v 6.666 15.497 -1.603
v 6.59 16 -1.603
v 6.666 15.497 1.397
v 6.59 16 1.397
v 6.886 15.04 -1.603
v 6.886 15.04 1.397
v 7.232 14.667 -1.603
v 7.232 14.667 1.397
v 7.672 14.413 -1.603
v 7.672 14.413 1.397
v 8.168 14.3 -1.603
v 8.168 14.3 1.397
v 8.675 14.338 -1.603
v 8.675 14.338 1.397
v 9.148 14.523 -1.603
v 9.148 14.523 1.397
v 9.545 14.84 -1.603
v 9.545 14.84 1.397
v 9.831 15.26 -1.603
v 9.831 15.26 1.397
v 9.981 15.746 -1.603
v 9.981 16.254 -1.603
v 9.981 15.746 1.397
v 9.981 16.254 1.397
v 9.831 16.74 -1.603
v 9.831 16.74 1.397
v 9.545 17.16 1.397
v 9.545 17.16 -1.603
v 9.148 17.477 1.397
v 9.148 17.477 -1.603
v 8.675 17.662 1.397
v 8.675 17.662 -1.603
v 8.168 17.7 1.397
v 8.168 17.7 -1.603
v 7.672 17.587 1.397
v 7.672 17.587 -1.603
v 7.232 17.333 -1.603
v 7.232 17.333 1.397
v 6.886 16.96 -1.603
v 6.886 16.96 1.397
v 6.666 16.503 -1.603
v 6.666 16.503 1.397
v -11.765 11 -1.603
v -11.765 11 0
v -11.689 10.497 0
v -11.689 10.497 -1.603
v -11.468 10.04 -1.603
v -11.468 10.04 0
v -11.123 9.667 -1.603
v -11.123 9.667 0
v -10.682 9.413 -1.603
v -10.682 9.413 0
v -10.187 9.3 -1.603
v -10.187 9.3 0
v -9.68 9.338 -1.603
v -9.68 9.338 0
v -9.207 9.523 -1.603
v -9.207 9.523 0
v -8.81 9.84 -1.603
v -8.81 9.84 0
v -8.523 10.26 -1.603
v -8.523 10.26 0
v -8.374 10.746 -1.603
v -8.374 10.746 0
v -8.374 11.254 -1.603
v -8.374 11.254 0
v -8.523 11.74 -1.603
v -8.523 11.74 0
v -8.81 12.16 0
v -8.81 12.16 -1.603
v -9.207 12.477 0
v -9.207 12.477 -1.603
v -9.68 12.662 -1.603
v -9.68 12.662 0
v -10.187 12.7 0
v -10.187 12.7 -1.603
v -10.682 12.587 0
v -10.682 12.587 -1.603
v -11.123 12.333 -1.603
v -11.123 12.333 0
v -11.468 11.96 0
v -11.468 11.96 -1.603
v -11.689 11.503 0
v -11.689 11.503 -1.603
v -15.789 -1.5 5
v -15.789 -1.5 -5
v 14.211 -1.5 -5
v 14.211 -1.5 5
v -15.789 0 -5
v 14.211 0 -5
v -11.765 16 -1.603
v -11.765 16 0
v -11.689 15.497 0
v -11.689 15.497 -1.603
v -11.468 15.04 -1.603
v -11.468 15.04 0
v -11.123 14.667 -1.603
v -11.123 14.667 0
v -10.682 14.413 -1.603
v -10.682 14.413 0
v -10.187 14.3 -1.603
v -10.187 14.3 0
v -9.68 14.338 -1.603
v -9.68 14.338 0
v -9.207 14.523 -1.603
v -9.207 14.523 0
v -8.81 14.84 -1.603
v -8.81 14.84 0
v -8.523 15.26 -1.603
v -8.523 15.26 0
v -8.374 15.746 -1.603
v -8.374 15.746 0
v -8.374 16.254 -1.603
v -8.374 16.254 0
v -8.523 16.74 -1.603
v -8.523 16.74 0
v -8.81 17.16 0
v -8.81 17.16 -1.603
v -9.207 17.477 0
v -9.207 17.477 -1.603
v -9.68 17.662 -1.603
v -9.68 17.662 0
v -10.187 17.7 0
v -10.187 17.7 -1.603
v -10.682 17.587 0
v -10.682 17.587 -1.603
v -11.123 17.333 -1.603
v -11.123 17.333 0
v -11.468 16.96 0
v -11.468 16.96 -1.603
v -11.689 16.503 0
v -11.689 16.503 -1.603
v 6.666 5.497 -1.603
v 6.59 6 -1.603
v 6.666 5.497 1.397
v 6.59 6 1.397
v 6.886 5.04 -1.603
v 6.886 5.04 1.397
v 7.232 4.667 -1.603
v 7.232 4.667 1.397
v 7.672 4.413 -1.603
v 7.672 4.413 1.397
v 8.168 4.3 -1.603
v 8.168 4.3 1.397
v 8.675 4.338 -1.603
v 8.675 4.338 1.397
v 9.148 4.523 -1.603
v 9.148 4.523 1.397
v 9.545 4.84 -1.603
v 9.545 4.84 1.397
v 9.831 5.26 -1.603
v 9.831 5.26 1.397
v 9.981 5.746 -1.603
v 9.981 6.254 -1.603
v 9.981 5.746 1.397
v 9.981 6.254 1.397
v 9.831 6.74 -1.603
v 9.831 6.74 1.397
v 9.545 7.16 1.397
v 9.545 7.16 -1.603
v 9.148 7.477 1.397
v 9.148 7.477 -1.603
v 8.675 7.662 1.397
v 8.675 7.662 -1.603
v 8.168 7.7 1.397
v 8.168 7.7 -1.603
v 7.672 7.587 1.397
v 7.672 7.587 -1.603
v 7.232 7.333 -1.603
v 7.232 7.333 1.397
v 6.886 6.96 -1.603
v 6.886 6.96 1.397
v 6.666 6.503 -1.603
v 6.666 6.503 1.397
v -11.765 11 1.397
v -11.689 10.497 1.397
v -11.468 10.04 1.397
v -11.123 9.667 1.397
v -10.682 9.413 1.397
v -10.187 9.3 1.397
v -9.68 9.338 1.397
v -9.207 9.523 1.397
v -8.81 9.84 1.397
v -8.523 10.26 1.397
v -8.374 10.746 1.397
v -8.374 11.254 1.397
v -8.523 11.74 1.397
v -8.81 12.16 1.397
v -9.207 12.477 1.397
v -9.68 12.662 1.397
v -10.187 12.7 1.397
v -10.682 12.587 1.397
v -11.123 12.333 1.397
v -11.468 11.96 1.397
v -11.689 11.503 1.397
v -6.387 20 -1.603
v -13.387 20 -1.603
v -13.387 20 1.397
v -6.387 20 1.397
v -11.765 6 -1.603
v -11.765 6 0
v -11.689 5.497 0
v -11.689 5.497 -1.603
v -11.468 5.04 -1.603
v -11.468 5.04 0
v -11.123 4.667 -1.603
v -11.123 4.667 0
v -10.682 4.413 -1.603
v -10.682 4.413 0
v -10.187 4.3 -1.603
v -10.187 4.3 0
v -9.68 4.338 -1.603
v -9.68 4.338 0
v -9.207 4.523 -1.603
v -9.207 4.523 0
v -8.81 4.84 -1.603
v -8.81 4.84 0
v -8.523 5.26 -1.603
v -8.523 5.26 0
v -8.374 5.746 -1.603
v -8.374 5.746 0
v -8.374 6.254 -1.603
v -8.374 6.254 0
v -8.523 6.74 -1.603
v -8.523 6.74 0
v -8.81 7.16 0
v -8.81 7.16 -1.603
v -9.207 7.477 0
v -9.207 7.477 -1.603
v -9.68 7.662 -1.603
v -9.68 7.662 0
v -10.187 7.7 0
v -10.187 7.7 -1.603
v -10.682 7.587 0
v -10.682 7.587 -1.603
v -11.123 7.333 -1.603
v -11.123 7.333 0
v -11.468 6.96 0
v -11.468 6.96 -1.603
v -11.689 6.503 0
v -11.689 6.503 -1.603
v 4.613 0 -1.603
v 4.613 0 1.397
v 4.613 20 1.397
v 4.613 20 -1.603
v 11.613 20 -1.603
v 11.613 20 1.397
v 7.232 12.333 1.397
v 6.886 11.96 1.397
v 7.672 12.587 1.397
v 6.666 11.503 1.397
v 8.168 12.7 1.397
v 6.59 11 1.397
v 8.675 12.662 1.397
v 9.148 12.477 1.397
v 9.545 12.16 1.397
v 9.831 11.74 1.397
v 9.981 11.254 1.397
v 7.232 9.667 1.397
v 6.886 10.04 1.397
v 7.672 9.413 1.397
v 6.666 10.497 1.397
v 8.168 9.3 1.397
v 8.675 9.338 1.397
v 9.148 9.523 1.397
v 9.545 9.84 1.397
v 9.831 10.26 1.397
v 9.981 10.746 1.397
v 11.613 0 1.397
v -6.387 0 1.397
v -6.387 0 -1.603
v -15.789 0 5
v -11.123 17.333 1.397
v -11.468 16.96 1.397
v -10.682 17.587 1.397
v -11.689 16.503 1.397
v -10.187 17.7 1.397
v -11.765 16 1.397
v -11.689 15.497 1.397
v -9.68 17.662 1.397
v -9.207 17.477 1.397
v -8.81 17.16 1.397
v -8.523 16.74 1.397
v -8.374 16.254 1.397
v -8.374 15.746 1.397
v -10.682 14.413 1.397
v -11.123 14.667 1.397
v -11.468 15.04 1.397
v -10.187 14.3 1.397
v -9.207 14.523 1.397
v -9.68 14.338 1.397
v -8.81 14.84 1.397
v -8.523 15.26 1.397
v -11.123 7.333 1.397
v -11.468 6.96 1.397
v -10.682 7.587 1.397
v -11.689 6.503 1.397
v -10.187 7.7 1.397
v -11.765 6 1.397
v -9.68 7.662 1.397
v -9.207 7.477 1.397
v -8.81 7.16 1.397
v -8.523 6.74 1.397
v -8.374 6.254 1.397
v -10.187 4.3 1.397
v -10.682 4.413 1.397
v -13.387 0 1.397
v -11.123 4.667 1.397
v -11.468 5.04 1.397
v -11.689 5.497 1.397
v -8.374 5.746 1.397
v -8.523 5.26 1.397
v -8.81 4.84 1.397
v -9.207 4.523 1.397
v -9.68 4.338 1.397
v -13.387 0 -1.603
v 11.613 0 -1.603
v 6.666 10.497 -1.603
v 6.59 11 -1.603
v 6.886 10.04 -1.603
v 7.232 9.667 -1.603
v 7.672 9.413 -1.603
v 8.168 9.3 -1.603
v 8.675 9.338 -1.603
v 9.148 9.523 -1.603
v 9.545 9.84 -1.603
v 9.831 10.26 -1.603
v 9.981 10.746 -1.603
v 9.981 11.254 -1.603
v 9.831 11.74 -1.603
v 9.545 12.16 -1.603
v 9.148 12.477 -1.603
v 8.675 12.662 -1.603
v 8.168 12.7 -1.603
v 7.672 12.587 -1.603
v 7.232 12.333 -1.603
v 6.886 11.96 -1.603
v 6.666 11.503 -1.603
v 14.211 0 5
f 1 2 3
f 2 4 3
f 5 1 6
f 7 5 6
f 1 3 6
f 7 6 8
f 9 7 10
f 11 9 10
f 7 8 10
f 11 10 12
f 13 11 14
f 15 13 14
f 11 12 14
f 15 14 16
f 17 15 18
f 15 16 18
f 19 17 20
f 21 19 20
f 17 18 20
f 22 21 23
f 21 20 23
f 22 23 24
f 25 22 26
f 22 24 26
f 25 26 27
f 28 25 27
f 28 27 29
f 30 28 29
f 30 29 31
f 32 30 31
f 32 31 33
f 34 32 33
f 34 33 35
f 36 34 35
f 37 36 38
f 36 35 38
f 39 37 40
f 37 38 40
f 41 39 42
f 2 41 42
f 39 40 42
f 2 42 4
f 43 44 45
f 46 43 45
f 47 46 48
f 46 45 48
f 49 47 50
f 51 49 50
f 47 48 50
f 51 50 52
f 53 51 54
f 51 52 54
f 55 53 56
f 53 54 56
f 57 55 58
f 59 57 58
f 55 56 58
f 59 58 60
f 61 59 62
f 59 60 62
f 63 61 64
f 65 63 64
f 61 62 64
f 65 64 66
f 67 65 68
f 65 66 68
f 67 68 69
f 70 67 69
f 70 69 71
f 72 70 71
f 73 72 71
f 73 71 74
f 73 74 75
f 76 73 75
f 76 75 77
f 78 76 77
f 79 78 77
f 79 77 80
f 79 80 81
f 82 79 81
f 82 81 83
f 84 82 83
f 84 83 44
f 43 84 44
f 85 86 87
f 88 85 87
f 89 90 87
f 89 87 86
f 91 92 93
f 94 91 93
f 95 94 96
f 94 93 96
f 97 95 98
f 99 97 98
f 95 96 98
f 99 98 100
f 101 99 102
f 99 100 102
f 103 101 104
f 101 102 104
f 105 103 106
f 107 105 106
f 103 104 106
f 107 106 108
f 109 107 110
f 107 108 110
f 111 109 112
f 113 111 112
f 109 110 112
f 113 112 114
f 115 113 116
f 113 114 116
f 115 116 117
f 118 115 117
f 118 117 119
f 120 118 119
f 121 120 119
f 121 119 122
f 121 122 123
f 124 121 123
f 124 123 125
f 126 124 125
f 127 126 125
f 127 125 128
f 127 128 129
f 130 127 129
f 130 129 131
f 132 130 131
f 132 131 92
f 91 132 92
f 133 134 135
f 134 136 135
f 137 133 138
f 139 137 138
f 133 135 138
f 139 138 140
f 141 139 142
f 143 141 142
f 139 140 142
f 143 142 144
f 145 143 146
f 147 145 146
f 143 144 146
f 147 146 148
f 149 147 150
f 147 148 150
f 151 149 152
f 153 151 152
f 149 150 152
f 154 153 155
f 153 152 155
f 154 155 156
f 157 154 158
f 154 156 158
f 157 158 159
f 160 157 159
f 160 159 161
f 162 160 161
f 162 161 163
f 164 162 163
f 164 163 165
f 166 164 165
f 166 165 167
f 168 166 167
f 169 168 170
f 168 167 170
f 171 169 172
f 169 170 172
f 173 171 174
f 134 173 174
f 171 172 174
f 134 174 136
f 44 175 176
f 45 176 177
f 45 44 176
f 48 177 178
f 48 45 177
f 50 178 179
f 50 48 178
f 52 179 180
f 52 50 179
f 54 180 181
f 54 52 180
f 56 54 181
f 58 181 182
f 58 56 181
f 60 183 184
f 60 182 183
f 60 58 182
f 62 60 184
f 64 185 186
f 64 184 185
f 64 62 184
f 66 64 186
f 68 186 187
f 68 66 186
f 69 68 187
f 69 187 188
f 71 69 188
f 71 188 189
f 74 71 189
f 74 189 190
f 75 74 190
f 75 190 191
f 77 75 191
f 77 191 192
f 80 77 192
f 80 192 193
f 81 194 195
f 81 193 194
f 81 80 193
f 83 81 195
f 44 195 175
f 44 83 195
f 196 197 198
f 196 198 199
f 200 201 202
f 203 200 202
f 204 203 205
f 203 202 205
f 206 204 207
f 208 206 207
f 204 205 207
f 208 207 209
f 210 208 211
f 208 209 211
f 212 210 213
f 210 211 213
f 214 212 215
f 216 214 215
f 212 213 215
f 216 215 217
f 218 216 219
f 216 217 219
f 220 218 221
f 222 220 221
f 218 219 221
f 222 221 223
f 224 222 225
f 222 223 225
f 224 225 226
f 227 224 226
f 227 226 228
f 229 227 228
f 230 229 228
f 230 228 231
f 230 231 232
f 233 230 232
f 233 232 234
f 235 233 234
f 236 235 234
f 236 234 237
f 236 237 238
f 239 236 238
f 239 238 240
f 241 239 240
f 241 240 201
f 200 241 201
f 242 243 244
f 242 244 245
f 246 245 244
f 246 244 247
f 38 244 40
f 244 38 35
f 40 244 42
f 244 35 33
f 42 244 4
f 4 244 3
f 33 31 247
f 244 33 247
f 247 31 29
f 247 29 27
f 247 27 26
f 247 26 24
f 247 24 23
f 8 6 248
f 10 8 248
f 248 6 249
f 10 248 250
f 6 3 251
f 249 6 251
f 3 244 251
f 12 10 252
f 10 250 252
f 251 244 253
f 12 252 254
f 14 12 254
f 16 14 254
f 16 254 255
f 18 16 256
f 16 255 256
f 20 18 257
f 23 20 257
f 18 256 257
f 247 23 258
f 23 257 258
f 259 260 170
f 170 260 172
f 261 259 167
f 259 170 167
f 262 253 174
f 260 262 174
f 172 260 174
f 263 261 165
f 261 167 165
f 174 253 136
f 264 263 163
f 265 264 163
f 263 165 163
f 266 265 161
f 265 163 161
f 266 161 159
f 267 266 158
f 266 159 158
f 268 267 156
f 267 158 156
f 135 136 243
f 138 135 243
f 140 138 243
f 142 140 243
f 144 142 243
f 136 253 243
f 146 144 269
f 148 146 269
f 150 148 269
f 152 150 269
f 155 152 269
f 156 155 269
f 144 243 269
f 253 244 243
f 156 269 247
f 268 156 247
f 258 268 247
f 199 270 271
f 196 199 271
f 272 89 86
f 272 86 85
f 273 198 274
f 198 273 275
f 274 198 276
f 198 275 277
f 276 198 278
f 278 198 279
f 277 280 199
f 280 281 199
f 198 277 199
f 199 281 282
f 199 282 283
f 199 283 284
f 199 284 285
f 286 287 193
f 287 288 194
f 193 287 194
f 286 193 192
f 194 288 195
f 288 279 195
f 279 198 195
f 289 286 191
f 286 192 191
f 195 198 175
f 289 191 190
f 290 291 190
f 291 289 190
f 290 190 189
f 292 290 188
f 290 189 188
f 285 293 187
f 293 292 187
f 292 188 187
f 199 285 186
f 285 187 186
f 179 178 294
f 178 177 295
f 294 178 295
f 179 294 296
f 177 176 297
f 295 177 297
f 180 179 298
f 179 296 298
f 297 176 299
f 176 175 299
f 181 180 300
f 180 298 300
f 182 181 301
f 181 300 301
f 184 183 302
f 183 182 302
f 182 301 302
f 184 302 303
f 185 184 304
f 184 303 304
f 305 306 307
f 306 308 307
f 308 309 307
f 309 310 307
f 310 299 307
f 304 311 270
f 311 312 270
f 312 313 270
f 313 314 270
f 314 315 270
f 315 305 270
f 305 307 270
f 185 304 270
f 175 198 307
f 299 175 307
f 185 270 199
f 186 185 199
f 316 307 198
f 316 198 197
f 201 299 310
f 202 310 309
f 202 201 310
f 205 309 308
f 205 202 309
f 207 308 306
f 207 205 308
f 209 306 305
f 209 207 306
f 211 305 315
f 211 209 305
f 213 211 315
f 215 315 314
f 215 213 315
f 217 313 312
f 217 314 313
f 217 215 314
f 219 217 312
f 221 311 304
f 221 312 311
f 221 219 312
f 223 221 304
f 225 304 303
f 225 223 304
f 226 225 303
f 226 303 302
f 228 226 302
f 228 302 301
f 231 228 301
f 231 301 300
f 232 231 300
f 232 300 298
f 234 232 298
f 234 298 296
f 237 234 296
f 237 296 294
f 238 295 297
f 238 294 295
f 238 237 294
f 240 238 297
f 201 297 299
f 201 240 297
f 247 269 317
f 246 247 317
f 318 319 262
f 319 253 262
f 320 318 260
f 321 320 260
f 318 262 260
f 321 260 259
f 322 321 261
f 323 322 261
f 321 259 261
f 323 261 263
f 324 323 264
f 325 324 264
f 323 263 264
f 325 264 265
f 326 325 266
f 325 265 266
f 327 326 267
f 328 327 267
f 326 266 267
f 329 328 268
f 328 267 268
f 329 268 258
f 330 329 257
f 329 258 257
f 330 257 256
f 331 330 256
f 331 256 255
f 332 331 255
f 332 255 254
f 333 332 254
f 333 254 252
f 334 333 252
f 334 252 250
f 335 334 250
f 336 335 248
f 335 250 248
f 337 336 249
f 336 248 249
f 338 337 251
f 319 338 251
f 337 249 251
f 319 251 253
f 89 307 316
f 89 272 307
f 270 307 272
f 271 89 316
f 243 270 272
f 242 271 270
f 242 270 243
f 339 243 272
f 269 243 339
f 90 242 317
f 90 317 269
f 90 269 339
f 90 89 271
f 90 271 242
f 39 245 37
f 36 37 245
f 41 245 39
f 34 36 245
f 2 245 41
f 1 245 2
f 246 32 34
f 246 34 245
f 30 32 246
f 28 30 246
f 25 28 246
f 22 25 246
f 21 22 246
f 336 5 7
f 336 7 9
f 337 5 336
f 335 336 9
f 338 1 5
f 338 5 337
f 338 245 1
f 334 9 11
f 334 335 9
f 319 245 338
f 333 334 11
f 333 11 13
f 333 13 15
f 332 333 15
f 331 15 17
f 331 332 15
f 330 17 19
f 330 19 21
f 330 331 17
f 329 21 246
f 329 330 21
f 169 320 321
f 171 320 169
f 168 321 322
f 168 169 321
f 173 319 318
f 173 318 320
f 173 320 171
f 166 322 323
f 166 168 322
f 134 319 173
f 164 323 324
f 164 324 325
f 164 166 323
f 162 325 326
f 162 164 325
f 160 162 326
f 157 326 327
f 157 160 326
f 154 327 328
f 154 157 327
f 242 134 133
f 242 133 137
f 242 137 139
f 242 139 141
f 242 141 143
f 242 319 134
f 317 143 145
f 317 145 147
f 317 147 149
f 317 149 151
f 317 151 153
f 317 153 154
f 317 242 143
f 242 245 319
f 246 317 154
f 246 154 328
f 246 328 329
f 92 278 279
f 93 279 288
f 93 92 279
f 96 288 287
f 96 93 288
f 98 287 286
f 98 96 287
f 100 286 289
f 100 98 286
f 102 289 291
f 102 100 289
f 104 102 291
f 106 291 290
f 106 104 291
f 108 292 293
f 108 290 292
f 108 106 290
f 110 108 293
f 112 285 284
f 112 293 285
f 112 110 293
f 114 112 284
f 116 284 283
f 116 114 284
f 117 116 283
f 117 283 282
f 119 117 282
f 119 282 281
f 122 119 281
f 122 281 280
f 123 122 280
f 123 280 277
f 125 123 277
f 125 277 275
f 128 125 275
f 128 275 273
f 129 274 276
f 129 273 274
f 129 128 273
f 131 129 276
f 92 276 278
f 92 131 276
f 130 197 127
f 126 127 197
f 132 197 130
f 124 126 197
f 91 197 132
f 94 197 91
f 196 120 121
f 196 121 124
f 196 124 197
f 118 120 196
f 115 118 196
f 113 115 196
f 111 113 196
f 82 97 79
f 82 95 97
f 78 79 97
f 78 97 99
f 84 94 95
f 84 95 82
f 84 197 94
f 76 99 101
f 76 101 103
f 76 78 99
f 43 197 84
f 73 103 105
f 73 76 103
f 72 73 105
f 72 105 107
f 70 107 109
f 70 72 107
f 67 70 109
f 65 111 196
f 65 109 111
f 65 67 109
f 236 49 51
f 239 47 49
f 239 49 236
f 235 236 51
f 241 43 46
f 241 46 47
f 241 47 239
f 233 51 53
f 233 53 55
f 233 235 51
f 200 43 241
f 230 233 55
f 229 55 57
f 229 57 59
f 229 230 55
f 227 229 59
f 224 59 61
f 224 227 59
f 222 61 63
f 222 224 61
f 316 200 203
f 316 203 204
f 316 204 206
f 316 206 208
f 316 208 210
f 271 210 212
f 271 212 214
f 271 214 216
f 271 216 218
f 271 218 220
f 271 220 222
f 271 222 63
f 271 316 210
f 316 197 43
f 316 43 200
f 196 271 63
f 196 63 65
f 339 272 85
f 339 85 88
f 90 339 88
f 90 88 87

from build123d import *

# Parameters (mm, degrees)
BOSS_EXTRUDE1_DEPTH = 1.5
SKETCH3_W           = 7
SKETCH3_H           = 3
BOSS_EXTRUDE2_DEPTH = 20
SKETCH4_R           = 1.705
CUT_EXTRUDE1_DEPTH  = 5
LPATTERN1_COUNT     = 3
LPATTERN1_PITCH     = 5


with BuildPart() as part:
    # Sketch1 → Boss-Extrude1 (new body)
    with BuildSketch(Plane(origin=(0, 0, 0), x_dir=(1, 0, 0), z_dir=(0, 1, 0))):
        Polygon((-5.789473684, 5), (-15.789473684, 5), (-15.789473684, -5), (-5.789473684, -5), (4.210526316, -5), (14.210526316, -5), (14.210526316, 5), (4.210526316, 5), align=None)
    extrude(amount=-BOSS_EXTRUDE1_DEPTH)

    # Sketch3 → Boss-Extrude2 (add)
    with BuildSketch(Plane(origin=(0, 0, 0), x_dir=(1, 0, 0), z_dir=(0, 1, 0))):
        with Locations((-9.886735186, 0.10262718)):
            Rectangle(SKETCH3_W, SKETCH3_H)
        with Locations((8.113264814, 0.10262718)):
            Rectangle(SKETCH3_W, SKETCH3_H)
    extrude(amount=BOSS_EXTRUDE2_DEPTH)

    # Sketch4 → Cut-Extrude1 (cut, symmetric)
    with BuildSketch(Plane.XY):
        with Locations(Location((-10.0595209, 16, 0), (0, 0, 180))):
            Circle(SKETCH4_R)
        with Locations(Location((8.29517143, 16, 0), (0, 0, 180))):
            Circle(SKETCH4_R)
    cut_extrude1 = extrude(amount=CUT_EXTRUDE1_DEPTH, both=True, mode=Mode.SUBTRACT)

    # LPattern1: Cut-Extrude1 ×3
    with Locations(*[(0, -i * LPATTERN1_PITCH, 0) for i in range(1, LPATTERN1_COUNT)]):
        add(cut_extrude1, mode=Mode.SUBTRACT)


solid = part.part
